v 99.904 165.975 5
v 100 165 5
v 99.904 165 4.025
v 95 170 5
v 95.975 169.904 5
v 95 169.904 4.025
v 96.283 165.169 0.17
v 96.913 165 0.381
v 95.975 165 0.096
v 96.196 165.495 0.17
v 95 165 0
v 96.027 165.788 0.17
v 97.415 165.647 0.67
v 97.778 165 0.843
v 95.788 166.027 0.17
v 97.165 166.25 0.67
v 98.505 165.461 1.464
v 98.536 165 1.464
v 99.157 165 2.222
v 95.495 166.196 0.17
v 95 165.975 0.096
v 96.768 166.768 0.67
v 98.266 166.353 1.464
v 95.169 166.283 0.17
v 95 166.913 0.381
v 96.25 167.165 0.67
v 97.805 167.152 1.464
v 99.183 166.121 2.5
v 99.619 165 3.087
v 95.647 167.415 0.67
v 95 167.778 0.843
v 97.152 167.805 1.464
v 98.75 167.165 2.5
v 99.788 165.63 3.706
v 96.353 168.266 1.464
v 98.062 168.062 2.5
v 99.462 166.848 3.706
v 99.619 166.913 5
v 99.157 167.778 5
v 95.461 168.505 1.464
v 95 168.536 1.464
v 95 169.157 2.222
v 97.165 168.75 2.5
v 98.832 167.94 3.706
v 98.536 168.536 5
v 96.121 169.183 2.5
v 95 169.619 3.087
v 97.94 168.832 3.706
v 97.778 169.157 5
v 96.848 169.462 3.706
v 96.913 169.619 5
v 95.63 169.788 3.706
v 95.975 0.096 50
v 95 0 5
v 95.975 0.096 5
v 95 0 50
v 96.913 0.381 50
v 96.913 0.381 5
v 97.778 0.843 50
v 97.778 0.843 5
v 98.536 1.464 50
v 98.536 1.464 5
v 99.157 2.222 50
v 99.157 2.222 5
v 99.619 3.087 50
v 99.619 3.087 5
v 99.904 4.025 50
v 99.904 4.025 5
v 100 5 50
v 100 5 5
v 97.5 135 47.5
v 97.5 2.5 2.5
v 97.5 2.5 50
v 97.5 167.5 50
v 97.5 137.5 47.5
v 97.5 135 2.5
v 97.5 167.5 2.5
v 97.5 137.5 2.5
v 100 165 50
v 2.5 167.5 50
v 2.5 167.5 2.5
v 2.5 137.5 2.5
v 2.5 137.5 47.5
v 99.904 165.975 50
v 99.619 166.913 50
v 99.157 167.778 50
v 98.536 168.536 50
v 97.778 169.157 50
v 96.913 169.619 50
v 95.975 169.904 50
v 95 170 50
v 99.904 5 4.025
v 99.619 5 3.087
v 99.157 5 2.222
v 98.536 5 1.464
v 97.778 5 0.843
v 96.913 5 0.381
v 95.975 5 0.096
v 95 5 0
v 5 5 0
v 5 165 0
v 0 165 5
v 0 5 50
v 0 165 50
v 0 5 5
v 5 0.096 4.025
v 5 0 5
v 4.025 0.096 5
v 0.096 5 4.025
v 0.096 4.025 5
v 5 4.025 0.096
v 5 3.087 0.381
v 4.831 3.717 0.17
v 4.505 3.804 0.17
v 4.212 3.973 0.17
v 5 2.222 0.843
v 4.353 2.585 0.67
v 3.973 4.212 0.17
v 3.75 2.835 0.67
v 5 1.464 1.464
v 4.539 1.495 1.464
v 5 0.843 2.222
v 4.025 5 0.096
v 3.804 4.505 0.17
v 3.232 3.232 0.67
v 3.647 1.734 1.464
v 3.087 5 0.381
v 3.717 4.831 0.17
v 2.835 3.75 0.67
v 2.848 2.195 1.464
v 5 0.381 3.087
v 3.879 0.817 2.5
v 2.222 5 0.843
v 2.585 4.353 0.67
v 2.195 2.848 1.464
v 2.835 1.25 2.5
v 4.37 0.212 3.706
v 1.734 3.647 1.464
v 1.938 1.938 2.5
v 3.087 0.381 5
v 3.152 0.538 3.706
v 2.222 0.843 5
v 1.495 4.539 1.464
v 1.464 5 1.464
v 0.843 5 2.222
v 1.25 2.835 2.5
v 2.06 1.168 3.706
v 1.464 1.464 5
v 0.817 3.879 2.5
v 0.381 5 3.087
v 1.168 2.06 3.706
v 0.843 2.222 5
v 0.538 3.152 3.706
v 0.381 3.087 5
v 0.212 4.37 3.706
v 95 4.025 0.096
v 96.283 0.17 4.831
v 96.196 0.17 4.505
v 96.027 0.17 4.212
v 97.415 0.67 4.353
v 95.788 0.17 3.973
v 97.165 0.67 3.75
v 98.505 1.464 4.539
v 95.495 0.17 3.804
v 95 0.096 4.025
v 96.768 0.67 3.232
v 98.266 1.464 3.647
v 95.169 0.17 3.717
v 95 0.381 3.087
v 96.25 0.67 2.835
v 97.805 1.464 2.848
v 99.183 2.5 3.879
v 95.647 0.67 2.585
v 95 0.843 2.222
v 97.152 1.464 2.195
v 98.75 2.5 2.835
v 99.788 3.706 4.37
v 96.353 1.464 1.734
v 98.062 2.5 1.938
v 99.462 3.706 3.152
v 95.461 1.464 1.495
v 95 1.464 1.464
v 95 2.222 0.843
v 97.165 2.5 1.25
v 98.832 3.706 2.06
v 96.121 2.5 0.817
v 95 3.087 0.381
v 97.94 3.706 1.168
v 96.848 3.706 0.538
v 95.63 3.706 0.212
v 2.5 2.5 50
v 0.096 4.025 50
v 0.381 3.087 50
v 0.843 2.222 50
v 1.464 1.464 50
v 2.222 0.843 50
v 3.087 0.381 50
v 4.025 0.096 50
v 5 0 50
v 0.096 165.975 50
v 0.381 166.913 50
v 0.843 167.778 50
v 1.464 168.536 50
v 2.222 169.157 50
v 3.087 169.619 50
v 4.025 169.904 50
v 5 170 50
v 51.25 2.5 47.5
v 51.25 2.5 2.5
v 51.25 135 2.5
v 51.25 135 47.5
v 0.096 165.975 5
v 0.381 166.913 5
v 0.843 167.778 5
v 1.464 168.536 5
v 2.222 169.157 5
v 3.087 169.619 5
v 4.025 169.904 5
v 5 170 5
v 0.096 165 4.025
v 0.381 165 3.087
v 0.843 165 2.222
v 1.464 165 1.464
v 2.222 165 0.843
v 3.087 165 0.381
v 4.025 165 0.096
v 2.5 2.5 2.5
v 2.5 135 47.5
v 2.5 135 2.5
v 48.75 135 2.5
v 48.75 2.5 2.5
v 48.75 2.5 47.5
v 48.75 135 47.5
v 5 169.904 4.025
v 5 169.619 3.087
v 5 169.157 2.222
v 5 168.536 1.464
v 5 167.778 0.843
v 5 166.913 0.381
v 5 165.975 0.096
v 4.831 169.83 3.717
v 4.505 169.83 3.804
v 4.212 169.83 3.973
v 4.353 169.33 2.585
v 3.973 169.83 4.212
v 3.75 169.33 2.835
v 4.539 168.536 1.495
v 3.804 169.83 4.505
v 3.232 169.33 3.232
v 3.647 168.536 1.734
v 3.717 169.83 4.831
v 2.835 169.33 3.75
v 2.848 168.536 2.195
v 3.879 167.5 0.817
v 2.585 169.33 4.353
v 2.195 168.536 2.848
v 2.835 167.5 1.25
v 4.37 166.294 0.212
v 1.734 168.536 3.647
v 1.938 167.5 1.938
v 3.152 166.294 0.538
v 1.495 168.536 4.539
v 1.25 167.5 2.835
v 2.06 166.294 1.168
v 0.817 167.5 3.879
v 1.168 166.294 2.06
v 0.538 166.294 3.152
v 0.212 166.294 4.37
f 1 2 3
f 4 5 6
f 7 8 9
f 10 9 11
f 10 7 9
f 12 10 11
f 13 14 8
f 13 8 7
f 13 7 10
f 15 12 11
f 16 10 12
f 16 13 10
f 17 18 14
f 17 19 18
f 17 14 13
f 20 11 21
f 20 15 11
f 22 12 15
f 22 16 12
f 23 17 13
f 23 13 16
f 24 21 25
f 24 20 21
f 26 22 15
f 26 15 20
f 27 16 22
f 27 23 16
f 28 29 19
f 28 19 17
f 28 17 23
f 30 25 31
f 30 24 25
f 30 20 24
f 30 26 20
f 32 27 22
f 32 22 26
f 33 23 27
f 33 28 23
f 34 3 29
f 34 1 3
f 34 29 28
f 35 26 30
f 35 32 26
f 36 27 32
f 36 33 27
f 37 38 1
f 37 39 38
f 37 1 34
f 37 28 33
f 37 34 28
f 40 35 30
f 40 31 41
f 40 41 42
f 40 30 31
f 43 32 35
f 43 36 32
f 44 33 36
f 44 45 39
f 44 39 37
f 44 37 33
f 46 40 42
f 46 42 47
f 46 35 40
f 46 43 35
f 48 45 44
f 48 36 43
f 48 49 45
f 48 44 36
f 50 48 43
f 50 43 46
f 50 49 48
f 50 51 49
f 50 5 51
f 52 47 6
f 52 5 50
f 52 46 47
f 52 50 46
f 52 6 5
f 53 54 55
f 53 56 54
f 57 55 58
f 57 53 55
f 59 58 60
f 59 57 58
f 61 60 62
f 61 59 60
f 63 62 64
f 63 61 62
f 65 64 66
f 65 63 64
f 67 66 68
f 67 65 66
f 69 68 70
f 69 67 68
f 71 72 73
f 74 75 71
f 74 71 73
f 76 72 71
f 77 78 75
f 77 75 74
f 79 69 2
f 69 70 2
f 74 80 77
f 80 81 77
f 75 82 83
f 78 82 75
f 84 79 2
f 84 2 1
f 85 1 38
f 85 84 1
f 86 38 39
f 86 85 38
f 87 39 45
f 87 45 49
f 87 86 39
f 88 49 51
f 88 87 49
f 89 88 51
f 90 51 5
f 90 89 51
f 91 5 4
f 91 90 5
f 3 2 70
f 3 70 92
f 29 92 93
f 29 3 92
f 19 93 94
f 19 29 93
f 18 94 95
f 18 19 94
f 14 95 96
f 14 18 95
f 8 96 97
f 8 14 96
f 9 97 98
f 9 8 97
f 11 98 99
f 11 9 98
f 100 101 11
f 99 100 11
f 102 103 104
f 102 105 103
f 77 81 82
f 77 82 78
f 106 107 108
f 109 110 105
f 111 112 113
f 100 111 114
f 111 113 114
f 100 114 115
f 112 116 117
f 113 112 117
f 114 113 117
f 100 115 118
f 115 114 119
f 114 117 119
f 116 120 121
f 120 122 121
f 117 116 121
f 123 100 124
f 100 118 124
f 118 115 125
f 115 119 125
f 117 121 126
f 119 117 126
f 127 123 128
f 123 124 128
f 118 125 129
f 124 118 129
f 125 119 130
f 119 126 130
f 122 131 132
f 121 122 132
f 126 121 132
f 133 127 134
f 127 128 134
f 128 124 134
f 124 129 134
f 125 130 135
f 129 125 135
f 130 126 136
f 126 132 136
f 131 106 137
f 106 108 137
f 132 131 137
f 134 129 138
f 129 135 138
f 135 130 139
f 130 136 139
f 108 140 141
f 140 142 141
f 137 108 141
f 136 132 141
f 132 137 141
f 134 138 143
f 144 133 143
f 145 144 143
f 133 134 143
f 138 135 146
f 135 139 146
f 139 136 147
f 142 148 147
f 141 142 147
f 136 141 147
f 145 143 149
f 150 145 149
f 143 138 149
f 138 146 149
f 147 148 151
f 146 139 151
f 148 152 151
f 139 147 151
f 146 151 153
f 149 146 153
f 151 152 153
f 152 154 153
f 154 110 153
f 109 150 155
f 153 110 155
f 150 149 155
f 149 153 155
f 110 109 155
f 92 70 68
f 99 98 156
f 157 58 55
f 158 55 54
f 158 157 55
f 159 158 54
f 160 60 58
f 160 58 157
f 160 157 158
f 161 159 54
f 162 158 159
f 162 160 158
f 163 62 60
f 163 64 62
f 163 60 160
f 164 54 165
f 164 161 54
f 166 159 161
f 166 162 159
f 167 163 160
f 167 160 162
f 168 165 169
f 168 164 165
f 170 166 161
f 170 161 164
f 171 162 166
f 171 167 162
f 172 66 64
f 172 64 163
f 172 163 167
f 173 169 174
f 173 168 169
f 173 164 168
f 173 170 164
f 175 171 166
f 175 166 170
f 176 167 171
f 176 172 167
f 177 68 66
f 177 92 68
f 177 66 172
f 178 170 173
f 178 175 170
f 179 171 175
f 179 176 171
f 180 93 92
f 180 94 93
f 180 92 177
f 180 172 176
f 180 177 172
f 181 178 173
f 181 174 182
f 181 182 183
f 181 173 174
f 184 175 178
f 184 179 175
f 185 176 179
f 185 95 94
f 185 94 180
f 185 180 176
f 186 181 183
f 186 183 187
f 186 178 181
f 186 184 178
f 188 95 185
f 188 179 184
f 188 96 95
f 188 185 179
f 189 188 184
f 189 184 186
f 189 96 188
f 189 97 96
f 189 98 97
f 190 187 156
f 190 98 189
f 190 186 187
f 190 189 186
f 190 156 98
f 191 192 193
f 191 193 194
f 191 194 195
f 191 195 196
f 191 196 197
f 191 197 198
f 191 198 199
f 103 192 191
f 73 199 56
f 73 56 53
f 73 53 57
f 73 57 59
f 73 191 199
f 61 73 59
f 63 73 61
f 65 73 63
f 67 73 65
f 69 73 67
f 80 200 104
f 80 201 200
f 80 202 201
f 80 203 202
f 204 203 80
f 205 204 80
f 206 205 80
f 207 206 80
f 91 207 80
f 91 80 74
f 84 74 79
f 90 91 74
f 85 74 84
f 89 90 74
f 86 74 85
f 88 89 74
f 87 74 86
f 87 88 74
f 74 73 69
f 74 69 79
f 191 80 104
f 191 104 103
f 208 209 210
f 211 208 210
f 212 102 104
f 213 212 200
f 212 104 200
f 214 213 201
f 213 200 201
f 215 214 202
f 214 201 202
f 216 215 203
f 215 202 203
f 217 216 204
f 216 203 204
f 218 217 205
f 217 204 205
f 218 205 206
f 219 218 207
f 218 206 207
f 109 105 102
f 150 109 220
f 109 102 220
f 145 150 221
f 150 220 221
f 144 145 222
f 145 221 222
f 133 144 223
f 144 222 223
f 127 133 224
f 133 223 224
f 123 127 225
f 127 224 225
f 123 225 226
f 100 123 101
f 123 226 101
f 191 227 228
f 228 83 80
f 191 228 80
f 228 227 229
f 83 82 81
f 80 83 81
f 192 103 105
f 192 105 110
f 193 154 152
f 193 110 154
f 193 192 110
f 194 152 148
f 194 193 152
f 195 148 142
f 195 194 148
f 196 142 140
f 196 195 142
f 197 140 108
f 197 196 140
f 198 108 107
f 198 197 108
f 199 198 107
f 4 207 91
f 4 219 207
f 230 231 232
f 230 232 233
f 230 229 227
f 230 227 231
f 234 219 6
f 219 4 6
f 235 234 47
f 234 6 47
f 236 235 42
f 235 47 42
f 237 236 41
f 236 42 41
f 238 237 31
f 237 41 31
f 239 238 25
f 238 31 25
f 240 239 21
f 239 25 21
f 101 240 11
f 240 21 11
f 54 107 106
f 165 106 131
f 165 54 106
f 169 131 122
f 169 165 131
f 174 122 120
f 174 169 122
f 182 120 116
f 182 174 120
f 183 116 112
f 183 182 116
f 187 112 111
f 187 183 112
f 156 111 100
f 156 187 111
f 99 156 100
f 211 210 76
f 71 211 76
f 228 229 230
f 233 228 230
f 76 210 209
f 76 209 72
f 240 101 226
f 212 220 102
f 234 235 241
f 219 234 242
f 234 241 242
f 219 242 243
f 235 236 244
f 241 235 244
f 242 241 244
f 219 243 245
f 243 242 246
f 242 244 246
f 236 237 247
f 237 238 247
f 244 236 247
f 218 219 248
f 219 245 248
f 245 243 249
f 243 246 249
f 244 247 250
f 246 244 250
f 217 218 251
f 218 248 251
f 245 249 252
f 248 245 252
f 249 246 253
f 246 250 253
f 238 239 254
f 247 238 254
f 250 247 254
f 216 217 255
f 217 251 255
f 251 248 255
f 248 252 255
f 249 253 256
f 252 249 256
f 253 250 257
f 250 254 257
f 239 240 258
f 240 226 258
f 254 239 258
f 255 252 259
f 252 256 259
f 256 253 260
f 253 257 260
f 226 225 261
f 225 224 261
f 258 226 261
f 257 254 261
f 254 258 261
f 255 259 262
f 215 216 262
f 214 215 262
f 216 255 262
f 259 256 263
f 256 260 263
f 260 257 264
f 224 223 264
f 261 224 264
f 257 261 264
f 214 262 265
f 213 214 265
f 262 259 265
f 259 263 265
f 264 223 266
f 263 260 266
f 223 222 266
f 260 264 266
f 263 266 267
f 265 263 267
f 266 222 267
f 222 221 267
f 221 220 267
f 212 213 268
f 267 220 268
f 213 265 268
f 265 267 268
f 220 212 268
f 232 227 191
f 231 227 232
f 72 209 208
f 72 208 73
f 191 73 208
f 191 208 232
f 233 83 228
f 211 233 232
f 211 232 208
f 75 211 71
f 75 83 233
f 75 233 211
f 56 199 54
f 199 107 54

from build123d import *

# Parameters (mm, degrees)
F0_W     = 100
F0_H     = 170
F1_DEPTH = 50
F2_T     = -2.5
F3_R     = 5
F4_W     = 95
F4_H     = 2.5
F5_DEPTH = 45
F6_W     = 2.5
F6_H     = 132.5
F7_DEPTH = 45


with BuildPart() as f1:
    # F0 (on Top) → F1 (new body)
    with BuildSketch(Plane.XY):
        with Locations((50, 85)):
            Rectangle(F0_W, F0_H)
    extrude(amount=F1_DEPTH)

    # F2
    f2_openings = [f1.faces().sort_by_distance(p)[0] for p in [
        (50, 85, 50),
    ]]
    offset(amount=F2_T, openings=f2_openings)

    # F3
    f3_edges = [f1.edges().sort_by_distance(p)[0] for p in [
        (100, 170, 25),
        (100, 85, 0),
        (100, 0, 25),
        (0, 0, 25),
        (50, 0, 0),
        (0, 85, 0),
        (50, 170, 0),
        (0, 170, 25),
    ]]
    fillet(f3_edges, radius=F3_R)

    # F4 (on face) → F5 (join)
    with BuildSketch(Plane.XY.offset(2.5)):
        with Locations((50, 136.25)):
            Rectangle(F4_W, F4_H)
    extrude(amount=F5_DEPTH)

    # F6 (on face) → F7 (join)
    with BuildSketch(Plane.XY.offset(2.5)):
        with Locations((50, 68.75)):
            Rectangle(F6_W, F6_H)
    extrude(amount=F7_DEPTH)


solid = f1.part
